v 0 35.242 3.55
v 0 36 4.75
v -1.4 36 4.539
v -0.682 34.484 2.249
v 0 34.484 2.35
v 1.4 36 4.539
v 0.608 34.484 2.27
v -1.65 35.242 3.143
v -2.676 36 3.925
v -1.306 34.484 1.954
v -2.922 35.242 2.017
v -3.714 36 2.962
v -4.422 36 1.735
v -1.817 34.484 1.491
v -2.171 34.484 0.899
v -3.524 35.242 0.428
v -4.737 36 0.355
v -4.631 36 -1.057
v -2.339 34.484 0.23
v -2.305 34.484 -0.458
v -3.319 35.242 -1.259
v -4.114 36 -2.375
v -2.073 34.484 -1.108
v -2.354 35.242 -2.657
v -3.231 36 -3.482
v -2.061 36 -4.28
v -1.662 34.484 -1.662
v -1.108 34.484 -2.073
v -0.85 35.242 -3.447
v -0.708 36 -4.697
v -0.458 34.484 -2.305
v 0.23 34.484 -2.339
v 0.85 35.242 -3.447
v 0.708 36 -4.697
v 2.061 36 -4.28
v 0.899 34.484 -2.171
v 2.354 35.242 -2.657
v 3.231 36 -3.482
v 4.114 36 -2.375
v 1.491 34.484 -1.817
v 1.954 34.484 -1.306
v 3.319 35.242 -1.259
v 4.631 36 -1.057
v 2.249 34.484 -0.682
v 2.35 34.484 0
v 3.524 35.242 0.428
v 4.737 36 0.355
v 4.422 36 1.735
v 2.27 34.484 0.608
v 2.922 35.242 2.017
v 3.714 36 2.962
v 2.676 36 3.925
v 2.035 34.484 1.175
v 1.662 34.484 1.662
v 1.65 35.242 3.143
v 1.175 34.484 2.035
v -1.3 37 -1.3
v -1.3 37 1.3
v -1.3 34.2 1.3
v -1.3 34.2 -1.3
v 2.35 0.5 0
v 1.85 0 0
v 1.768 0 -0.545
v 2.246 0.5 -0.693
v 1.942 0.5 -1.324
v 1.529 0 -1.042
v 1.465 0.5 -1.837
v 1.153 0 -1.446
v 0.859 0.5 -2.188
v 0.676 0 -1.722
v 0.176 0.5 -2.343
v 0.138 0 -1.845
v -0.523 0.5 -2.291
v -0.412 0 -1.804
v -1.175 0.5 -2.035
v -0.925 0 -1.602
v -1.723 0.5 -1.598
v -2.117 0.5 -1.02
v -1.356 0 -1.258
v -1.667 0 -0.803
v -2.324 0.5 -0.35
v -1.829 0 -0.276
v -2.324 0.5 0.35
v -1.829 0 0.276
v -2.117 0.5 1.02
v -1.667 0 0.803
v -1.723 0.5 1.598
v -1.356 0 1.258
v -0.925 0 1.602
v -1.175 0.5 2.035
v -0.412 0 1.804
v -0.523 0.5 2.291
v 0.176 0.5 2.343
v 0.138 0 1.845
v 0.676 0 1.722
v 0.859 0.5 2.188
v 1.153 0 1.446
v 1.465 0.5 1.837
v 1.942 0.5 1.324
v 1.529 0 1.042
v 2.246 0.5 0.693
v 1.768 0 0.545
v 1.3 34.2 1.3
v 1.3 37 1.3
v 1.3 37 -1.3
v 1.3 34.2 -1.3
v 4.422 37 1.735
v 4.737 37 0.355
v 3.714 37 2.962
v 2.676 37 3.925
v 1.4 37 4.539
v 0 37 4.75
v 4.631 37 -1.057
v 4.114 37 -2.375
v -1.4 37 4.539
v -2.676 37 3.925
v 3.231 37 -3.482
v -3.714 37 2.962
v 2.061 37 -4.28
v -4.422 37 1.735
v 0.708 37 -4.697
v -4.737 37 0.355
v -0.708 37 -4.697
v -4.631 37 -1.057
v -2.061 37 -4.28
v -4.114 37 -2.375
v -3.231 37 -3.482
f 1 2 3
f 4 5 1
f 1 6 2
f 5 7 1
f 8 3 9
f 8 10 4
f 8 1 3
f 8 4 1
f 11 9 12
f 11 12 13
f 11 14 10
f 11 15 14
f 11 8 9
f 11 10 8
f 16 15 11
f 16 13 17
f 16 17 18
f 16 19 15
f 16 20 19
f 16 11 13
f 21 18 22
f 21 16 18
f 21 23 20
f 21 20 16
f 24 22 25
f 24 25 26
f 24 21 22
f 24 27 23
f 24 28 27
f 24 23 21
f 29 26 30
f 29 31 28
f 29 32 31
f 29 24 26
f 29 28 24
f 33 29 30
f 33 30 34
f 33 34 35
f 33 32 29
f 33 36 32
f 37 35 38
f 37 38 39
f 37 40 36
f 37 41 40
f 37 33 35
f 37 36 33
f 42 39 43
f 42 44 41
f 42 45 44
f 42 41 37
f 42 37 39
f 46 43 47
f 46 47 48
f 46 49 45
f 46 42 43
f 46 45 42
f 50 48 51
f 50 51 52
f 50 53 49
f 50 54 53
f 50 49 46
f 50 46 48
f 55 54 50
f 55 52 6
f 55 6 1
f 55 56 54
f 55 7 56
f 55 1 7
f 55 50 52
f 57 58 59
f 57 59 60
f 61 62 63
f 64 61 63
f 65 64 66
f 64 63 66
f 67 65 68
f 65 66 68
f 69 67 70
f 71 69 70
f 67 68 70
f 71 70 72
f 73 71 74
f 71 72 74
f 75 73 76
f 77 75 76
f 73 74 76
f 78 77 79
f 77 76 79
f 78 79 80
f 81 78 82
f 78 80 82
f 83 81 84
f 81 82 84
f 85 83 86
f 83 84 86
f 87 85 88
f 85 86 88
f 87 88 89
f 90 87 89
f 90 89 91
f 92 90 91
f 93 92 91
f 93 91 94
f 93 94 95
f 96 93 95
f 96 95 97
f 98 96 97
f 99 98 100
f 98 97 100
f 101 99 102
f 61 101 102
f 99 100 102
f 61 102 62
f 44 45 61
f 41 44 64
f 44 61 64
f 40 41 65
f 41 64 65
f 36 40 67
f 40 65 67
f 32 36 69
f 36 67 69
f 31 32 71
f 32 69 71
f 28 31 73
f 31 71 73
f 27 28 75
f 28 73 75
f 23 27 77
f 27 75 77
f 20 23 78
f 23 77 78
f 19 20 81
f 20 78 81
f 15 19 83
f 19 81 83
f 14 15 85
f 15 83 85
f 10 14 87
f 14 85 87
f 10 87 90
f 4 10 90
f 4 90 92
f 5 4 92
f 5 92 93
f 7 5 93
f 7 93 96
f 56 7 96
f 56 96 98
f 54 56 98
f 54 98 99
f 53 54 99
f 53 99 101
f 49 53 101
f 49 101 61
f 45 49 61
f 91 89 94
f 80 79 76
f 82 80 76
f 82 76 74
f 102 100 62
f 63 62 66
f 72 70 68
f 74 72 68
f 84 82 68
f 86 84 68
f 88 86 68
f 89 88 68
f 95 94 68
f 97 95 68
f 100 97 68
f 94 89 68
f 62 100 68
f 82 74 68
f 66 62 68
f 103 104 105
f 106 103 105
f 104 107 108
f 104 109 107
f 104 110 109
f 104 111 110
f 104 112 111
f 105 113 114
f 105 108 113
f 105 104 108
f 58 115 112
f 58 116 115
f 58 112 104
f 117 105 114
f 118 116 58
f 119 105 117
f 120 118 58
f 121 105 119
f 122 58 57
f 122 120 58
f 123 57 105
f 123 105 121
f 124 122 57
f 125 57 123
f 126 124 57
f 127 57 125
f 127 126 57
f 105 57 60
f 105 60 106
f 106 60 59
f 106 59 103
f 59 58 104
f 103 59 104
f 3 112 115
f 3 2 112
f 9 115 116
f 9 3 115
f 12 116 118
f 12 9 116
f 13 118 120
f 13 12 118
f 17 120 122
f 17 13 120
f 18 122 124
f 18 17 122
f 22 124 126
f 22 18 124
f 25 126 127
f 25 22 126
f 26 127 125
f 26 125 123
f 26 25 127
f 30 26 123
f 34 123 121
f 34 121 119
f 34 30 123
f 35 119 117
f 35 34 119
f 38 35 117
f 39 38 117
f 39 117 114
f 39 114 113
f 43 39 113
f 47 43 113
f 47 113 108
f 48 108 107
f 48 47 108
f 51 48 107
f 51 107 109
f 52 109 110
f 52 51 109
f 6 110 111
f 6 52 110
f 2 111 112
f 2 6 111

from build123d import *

# Parameters (mm, degrees)
SKETCH1_R           = 2.35
BOSS_EXTRUDE1_DEPTH = 37
CHAMFER1_SIZE       = 0.5
SKETCH3_W           = 2.6
SKETCH3_H           = 2.6
CUT_EXTRUDE1_DEPTH  = 2.8


with BuildPart() as part:
    # Sketch1 → Boss-Extrude1 (new body)
    with BuildSketch(Plane(origin=(0, 0, 0), x_dir=(1, 0, 0), z_dir=(0, 1, 0))):
        Circle(SKETCH1_R)
    extrude(amount=BOSS_EXTRUDE1_DEPTH)

    # Sketch2 → Revolve1 (revolve)
    with BuildSketch(Plane(origin=(0, 0, 0), x_dir=(0, 0, -1), z_dir=(1, 0, 0))):
        Polygon((0, 37), (-4.75, 37), (-4.75, 36), (0, 33), align=None)
    revolve(axis=Axis((0, 33, 0), (0, -1, 0)))

    # Chamfer1
    chamfer1_edges = [part.edges().sort_by_distance(p)[0] for p in [
        (-2.35, 0, 0),
    ]]
    chamfer(chamfer1_edges, length=CHAMFER1_SIZE)

    # Sketch3 → Cut-Extrude1 (cut)
    with BuildSketch(Plane(origin=(0, 37, 0), x_dir=(1, 0, 0), z_dir=(0, 1, 0))):
        Rectangle(SKETCH3_W, SKETCH3_H)
    extrude(amount=-CUT_EXTRUDE1_DEPTH, mode=Mode.SUBTRACT)


solid = part.part
